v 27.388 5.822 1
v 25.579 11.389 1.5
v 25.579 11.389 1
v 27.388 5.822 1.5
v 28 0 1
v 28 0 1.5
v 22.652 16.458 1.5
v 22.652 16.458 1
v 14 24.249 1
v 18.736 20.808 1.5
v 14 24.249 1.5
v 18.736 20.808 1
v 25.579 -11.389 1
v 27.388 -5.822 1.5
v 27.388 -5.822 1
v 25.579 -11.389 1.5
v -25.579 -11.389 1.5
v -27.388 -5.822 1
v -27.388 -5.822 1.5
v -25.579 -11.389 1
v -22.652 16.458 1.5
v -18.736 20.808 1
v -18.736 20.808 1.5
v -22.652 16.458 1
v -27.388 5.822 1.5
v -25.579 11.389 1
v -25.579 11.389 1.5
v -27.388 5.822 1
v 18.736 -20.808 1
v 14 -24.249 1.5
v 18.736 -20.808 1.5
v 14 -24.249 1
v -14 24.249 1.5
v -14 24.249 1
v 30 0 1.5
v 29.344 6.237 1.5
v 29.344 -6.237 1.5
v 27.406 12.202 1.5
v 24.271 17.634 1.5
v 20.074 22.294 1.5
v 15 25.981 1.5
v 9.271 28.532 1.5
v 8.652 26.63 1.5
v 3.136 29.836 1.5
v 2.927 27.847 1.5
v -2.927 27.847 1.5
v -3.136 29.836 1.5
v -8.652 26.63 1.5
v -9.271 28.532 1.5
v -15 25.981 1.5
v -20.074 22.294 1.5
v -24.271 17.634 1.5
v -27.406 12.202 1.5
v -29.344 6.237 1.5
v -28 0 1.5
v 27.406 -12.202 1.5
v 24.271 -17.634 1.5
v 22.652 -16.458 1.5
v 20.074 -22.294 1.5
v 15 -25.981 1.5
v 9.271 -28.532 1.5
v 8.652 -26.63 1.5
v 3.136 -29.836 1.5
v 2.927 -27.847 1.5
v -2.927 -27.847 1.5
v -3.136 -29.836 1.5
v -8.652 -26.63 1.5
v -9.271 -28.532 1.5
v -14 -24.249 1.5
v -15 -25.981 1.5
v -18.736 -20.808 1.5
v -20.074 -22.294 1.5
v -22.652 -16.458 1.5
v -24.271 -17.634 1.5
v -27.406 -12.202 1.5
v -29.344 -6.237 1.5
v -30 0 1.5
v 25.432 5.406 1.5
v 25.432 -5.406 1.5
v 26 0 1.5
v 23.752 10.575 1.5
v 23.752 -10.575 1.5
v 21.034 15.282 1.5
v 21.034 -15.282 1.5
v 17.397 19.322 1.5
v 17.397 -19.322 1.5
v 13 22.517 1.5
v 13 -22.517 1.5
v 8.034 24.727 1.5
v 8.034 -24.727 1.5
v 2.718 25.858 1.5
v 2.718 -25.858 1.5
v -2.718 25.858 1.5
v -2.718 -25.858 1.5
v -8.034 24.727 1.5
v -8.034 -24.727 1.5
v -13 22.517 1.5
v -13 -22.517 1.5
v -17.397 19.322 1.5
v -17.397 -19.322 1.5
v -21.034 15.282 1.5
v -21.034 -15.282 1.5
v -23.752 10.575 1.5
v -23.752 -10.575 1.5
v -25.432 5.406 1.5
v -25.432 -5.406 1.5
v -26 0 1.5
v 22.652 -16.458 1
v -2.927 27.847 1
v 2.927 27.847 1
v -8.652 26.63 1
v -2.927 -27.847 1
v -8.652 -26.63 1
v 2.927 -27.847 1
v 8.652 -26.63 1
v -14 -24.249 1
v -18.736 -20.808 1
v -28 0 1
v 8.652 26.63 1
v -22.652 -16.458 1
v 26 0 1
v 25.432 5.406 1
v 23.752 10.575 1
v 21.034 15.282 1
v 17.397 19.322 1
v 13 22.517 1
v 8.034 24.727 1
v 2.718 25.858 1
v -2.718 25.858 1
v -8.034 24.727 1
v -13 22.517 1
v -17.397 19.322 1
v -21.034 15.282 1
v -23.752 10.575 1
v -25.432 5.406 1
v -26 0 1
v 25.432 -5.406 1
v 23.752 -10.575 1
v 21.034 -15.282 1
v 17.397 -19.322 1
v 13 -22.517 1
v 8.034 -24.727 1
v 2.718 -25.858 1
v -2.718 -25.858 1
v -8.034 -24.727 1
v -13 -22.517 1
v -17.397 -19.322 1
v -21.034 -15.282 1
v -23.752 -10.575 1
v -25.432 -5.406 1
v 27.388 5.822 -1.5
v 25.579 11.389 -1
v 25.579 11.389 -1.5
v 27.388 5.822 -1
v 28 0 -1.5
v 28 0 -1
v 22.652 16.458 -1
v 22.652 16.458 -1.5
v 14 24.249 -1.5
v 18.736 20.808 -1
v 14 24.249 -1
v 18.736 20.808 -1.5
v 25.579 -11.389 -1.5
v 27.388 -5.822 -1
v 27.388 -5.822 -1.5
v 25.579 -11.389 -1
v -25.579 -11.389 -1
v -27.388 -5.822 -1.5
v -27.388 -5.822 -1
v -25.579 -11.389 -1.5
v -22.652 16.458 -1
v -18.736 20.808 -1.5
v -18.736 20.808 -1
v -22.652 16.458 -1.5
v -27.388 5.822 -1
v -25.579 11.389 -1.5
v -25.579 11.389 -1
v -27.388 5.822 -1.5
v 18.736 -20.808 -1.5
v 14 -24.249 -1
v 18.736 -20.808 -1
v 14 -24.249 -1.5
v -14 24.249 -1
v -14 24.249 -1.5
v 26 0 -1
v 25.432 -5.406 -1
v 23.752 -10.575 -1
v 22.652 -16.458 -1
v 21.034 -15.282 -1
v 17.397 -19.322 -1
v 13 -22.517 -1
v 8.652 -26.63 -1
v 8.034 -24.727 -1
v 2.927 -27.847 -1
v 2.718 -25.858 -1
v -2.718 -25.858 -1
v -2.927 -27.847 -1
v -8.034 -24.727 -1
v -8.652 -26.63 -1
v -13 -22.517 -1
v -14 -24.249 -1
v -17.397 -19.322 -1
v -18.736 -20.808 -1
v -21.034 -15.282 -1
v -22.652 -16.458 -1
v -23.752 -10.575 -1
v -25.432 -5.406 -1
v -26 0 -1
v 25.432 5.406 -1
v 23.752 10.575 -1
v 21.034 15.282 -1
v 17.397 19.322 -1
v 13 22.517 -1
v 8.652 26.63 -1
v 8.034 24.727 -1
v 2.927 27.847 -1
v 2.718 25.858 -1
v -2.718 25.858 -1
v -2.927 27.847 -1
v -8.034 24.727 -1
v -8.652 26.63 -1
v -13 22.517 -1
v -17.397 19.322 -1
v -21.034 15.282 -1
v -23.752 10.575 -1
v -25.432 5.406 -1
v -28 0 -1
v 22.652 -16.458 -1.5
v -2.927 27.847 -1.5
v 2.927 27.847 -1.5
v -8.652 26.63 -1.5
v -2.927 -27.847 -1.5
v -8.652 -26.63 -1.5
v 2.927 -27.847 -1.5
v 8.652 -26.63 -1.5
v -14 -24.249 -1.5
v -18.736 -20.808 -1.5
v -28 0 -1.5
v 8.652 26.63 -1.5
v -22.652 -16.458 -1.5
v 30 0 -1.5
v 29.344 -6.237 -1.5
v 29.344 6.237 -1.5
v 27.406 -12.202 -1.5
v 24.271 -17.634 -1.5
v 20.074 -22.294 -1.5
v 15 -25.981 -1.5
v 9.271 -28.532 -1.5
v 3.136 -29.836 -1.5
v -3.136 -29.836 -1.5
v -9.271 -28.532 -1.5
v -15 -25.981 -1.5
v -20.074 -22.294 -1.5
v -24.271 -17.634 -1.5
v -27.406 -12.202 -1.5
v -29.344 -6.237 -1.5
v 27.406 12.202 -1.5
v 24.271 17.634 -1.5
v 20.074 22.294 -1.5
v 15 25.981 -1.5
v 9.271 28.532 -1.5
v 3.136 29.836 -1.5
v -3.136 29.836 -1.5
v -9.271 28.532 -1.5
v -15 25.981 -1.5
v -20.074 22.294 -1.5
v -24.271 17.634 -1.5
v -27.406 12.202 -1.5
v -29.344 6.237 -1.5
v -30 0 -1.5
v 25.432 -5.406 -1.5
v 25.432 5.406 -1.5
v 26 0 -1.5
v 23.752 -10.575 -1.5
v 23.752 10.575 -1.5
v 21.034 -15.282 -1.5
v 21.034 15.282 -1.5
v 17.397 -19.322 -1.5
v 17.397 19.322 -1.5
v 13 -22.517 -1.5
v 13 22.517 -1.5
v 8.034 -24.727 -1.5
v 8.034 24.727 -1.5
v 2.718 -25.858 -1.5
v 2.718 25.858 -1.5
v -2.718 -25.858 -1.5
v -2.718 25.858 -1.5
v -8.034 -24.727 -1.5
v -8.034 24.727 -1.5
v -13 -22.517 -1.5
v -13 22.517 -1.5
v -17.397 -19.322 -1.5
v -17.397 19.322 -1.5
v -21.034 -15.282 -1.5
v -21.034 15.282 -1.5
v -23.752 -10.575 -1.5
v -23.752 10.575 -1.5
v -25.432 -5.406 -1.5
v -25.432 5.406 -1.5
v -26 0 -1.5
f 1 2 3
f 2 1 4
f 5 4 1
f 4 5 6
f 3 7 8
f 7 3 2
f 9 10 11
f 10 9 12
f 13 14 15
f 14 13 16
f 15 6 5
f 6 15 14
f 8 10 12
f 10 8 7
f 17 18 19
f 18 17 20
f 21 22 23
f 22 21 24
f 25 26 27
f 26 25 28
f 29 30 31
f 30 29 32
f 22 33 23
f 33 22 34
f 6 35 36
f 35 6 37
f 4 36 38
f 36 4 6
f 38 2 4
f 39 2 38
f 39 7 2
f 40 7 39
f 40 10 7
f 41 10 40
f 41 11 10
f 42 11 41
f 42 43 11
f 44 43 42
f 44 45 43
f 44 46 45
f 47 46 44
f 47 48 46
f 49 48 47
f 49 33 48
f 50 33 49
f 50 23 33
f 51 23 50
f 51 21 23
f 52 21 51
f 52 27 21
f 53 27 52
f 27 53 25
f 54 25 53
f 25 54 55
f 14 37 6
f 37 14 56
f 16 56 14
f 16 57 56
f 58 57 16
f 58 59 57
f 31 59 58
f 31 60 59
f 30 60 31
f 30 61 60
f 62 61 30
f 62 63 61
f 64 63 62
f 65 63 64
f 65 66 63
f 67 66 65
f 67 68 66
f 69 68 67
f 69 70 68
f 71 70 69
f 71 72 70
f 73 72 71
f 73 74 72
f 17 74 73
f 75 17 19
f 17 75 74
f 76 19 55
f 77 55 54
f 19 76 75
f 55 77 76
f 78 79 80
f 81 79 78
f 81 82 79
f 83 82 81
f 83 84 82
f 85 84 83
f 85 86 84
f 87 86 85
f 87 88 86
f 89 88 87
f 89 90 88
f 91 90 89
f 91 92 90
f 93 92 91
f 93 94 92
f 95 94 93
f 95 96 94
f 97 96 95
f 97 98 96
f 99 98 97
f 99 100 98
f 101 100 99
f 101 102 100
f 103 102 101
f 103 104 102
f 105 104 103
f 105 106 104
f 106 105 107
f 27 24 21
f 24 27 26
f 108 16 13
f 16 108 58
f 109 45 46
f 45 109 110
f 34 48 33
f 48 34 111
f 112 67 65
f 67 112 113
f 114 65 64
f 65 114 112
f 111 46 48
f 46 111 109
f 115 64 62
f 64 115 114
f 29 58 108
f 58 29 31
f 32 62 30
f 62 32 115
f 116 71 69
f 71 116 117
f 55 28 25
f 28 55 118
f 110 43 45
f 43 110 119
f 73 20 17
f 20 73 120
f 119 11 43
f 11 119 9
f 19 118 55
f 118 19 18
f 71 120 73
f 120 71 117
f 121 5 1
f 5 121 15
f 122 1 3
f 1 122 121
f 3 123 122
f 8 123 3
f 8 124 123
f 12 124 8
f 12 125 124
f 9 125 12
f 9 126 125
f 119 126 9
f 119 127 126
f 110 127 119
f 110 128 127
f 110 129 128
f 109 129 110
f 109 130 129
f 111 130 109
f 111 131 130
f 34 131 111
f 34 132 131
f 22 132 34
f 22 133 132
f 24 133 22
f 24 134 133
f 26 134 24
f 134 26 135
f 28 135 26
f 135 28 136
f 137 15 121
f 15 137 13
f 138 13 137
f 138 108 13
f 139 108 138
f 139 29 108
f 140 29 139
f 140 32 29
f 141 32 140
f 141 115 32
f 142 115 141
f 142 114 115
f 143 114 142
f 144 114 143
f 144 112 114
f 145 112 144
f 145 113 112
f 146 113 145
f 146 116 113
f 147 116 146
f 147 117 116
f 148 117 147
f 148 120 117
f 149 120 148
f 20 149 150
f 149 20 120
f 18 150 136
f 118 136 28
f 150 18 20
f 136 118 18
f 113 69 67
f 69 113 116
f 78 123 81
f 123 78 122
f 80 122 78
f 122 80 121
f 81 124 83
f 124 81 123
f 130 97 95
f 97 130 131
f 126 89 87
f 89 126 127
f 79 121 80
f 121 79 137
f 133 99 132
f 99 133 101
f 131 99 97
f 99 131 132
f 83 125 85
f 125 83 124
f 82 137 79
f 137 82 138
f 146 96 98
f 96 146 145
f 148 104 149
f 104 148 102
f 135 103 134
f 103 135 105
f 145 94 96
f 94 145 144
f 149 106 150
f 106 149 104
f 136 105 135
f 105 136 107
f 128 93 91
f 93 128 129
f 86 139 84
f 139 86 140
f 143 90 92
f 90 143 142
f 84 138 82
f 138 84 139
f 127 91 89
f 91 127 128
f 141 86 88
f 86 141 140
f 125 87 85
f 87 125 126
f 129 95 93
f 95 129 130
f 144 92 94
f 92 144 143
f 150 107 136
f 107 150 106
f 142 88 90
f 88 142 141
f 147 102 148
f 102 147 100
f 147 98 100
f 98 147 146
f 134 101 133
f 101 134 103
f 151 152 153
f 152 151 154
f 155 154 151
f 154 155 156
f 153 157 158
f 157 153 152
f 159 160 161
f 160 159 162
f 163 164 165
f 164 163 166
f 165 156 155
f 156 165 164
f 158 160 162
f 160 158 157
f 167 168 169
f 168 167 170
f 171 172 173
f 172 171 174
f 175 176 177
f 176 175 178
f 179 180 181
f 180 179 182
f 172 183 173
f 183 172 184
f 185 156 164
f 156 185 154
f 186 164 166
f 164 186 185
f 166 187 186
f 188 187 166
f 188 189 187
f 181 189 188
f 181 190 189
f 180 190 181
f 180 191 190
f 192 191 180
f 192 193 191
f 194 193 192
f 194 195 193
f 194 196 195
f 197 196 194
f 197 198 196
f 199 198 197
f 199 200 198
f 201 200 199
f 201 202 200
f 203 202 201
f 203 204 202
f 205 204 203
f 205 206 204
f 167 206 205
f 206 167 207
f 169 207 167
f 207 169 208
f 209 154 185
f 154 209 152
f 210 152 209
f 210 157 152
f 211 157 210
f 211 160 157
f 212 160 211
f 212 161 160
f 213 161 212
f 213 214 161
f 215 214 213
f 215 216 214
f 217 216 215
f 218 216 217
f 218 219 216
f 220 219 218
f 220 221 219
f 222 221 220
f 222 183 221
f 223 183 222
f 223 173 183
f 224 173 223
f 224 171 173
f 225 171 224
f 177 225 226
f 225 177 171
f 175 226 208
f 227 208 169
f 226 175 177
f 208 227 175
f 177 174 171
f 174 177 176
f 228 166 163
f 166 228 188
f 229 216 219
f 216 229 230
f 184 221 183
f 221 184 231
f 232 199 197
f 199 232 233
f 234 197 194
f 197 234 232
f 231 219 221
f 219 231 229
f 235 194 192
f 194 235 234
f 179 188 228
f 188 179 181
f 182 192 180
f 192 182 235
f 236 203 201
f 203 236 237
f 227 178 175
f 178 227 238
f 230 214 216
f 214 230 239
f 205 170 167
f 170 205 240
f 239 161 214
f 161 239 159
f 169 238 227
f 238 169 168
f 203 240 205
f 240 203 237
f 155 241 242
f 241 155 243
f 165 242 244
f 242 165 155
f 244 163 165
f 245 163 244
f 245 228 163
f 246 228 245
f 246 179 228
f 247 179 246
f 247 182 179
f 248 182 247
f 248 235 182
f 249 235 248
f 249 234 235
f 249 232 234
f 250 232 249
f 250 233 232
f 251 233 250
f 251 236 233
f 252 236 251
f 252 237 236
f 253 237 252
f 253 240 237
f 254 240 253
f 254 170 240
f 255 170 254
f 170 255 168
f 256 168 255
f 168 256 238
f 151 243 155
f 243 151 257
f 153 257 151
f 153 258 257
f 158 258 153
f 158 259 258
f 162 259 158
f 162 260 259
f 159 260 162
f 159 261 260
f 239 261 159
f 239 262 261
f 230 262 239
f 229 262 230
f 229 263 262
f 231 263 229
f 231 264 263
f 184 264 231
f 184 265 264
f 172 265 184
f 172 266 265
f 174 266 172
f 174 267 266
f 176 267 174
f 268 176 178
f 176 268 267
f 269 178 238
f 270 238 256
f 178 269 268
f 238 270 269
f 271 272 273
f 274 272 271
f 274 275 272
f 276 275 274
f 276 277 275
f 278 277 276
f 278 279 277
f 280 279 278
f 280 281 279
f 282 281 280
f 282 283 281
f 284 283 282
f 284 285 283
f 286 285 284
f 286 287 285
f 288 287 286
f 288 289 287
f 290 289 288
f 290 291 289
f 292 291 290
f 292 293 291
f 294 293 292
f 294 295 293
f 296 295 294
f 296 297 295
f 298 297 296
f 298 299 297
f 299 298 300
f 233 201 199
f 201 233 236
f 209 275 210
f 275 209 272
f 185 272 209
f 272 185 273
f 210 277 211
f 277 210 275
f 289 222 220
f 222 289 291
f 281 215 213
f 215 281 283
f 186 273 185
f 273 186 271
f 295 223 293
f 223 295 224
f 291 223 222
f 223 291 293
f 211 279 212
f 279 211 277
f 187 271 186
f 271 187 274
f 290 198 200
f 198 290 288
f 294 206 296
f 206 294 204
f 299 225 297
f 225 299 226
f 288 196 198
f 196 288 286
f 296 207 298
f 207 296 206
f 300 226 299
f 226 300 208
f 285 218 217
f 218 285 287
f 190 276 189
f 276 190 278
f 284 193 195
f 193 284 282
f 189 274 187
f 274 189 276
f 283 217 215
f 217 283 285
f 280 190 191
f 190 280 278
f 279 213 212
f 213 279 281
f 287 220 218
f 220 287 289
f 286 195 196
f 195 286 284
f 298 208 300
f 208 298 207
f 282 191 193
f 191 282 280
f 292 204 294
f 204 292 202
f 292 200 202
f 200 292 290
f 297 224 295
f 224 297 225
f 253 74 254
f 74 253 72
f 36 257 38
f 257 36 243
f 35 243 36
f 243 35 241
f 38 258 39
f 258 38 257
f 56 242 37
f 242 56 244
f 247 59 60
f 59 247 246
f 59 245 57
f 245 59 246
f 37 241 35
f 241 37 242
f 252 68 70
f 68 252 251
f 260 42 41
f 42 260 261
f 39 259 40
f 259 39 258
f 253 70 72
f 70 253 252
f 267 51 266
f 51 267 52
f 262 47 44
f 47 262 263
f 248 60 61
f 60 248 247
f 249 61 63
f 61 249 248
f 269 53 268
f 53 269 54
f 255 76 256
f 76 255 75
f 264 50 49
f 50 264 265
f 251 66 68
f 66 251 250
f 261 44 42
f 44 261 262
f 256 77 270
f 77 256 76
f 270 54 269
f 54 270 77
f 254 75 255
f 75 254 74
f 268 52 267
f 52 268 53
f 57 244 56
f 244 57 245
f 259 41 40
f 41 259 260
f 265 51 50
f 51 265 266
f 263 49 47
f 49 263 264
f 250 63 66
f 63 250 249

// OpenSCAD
difference()
{
    cylinder(3,30,30,true);
    translate([0,0,1])difference()
    {
        cylinder(.5,28,28);
        cylinder(5,26,26);
    }
    translate([0,0,-1.5])difference()
    {
        cylinder(.5,28,28);
        cylinder(5,26,26);
    }
}
